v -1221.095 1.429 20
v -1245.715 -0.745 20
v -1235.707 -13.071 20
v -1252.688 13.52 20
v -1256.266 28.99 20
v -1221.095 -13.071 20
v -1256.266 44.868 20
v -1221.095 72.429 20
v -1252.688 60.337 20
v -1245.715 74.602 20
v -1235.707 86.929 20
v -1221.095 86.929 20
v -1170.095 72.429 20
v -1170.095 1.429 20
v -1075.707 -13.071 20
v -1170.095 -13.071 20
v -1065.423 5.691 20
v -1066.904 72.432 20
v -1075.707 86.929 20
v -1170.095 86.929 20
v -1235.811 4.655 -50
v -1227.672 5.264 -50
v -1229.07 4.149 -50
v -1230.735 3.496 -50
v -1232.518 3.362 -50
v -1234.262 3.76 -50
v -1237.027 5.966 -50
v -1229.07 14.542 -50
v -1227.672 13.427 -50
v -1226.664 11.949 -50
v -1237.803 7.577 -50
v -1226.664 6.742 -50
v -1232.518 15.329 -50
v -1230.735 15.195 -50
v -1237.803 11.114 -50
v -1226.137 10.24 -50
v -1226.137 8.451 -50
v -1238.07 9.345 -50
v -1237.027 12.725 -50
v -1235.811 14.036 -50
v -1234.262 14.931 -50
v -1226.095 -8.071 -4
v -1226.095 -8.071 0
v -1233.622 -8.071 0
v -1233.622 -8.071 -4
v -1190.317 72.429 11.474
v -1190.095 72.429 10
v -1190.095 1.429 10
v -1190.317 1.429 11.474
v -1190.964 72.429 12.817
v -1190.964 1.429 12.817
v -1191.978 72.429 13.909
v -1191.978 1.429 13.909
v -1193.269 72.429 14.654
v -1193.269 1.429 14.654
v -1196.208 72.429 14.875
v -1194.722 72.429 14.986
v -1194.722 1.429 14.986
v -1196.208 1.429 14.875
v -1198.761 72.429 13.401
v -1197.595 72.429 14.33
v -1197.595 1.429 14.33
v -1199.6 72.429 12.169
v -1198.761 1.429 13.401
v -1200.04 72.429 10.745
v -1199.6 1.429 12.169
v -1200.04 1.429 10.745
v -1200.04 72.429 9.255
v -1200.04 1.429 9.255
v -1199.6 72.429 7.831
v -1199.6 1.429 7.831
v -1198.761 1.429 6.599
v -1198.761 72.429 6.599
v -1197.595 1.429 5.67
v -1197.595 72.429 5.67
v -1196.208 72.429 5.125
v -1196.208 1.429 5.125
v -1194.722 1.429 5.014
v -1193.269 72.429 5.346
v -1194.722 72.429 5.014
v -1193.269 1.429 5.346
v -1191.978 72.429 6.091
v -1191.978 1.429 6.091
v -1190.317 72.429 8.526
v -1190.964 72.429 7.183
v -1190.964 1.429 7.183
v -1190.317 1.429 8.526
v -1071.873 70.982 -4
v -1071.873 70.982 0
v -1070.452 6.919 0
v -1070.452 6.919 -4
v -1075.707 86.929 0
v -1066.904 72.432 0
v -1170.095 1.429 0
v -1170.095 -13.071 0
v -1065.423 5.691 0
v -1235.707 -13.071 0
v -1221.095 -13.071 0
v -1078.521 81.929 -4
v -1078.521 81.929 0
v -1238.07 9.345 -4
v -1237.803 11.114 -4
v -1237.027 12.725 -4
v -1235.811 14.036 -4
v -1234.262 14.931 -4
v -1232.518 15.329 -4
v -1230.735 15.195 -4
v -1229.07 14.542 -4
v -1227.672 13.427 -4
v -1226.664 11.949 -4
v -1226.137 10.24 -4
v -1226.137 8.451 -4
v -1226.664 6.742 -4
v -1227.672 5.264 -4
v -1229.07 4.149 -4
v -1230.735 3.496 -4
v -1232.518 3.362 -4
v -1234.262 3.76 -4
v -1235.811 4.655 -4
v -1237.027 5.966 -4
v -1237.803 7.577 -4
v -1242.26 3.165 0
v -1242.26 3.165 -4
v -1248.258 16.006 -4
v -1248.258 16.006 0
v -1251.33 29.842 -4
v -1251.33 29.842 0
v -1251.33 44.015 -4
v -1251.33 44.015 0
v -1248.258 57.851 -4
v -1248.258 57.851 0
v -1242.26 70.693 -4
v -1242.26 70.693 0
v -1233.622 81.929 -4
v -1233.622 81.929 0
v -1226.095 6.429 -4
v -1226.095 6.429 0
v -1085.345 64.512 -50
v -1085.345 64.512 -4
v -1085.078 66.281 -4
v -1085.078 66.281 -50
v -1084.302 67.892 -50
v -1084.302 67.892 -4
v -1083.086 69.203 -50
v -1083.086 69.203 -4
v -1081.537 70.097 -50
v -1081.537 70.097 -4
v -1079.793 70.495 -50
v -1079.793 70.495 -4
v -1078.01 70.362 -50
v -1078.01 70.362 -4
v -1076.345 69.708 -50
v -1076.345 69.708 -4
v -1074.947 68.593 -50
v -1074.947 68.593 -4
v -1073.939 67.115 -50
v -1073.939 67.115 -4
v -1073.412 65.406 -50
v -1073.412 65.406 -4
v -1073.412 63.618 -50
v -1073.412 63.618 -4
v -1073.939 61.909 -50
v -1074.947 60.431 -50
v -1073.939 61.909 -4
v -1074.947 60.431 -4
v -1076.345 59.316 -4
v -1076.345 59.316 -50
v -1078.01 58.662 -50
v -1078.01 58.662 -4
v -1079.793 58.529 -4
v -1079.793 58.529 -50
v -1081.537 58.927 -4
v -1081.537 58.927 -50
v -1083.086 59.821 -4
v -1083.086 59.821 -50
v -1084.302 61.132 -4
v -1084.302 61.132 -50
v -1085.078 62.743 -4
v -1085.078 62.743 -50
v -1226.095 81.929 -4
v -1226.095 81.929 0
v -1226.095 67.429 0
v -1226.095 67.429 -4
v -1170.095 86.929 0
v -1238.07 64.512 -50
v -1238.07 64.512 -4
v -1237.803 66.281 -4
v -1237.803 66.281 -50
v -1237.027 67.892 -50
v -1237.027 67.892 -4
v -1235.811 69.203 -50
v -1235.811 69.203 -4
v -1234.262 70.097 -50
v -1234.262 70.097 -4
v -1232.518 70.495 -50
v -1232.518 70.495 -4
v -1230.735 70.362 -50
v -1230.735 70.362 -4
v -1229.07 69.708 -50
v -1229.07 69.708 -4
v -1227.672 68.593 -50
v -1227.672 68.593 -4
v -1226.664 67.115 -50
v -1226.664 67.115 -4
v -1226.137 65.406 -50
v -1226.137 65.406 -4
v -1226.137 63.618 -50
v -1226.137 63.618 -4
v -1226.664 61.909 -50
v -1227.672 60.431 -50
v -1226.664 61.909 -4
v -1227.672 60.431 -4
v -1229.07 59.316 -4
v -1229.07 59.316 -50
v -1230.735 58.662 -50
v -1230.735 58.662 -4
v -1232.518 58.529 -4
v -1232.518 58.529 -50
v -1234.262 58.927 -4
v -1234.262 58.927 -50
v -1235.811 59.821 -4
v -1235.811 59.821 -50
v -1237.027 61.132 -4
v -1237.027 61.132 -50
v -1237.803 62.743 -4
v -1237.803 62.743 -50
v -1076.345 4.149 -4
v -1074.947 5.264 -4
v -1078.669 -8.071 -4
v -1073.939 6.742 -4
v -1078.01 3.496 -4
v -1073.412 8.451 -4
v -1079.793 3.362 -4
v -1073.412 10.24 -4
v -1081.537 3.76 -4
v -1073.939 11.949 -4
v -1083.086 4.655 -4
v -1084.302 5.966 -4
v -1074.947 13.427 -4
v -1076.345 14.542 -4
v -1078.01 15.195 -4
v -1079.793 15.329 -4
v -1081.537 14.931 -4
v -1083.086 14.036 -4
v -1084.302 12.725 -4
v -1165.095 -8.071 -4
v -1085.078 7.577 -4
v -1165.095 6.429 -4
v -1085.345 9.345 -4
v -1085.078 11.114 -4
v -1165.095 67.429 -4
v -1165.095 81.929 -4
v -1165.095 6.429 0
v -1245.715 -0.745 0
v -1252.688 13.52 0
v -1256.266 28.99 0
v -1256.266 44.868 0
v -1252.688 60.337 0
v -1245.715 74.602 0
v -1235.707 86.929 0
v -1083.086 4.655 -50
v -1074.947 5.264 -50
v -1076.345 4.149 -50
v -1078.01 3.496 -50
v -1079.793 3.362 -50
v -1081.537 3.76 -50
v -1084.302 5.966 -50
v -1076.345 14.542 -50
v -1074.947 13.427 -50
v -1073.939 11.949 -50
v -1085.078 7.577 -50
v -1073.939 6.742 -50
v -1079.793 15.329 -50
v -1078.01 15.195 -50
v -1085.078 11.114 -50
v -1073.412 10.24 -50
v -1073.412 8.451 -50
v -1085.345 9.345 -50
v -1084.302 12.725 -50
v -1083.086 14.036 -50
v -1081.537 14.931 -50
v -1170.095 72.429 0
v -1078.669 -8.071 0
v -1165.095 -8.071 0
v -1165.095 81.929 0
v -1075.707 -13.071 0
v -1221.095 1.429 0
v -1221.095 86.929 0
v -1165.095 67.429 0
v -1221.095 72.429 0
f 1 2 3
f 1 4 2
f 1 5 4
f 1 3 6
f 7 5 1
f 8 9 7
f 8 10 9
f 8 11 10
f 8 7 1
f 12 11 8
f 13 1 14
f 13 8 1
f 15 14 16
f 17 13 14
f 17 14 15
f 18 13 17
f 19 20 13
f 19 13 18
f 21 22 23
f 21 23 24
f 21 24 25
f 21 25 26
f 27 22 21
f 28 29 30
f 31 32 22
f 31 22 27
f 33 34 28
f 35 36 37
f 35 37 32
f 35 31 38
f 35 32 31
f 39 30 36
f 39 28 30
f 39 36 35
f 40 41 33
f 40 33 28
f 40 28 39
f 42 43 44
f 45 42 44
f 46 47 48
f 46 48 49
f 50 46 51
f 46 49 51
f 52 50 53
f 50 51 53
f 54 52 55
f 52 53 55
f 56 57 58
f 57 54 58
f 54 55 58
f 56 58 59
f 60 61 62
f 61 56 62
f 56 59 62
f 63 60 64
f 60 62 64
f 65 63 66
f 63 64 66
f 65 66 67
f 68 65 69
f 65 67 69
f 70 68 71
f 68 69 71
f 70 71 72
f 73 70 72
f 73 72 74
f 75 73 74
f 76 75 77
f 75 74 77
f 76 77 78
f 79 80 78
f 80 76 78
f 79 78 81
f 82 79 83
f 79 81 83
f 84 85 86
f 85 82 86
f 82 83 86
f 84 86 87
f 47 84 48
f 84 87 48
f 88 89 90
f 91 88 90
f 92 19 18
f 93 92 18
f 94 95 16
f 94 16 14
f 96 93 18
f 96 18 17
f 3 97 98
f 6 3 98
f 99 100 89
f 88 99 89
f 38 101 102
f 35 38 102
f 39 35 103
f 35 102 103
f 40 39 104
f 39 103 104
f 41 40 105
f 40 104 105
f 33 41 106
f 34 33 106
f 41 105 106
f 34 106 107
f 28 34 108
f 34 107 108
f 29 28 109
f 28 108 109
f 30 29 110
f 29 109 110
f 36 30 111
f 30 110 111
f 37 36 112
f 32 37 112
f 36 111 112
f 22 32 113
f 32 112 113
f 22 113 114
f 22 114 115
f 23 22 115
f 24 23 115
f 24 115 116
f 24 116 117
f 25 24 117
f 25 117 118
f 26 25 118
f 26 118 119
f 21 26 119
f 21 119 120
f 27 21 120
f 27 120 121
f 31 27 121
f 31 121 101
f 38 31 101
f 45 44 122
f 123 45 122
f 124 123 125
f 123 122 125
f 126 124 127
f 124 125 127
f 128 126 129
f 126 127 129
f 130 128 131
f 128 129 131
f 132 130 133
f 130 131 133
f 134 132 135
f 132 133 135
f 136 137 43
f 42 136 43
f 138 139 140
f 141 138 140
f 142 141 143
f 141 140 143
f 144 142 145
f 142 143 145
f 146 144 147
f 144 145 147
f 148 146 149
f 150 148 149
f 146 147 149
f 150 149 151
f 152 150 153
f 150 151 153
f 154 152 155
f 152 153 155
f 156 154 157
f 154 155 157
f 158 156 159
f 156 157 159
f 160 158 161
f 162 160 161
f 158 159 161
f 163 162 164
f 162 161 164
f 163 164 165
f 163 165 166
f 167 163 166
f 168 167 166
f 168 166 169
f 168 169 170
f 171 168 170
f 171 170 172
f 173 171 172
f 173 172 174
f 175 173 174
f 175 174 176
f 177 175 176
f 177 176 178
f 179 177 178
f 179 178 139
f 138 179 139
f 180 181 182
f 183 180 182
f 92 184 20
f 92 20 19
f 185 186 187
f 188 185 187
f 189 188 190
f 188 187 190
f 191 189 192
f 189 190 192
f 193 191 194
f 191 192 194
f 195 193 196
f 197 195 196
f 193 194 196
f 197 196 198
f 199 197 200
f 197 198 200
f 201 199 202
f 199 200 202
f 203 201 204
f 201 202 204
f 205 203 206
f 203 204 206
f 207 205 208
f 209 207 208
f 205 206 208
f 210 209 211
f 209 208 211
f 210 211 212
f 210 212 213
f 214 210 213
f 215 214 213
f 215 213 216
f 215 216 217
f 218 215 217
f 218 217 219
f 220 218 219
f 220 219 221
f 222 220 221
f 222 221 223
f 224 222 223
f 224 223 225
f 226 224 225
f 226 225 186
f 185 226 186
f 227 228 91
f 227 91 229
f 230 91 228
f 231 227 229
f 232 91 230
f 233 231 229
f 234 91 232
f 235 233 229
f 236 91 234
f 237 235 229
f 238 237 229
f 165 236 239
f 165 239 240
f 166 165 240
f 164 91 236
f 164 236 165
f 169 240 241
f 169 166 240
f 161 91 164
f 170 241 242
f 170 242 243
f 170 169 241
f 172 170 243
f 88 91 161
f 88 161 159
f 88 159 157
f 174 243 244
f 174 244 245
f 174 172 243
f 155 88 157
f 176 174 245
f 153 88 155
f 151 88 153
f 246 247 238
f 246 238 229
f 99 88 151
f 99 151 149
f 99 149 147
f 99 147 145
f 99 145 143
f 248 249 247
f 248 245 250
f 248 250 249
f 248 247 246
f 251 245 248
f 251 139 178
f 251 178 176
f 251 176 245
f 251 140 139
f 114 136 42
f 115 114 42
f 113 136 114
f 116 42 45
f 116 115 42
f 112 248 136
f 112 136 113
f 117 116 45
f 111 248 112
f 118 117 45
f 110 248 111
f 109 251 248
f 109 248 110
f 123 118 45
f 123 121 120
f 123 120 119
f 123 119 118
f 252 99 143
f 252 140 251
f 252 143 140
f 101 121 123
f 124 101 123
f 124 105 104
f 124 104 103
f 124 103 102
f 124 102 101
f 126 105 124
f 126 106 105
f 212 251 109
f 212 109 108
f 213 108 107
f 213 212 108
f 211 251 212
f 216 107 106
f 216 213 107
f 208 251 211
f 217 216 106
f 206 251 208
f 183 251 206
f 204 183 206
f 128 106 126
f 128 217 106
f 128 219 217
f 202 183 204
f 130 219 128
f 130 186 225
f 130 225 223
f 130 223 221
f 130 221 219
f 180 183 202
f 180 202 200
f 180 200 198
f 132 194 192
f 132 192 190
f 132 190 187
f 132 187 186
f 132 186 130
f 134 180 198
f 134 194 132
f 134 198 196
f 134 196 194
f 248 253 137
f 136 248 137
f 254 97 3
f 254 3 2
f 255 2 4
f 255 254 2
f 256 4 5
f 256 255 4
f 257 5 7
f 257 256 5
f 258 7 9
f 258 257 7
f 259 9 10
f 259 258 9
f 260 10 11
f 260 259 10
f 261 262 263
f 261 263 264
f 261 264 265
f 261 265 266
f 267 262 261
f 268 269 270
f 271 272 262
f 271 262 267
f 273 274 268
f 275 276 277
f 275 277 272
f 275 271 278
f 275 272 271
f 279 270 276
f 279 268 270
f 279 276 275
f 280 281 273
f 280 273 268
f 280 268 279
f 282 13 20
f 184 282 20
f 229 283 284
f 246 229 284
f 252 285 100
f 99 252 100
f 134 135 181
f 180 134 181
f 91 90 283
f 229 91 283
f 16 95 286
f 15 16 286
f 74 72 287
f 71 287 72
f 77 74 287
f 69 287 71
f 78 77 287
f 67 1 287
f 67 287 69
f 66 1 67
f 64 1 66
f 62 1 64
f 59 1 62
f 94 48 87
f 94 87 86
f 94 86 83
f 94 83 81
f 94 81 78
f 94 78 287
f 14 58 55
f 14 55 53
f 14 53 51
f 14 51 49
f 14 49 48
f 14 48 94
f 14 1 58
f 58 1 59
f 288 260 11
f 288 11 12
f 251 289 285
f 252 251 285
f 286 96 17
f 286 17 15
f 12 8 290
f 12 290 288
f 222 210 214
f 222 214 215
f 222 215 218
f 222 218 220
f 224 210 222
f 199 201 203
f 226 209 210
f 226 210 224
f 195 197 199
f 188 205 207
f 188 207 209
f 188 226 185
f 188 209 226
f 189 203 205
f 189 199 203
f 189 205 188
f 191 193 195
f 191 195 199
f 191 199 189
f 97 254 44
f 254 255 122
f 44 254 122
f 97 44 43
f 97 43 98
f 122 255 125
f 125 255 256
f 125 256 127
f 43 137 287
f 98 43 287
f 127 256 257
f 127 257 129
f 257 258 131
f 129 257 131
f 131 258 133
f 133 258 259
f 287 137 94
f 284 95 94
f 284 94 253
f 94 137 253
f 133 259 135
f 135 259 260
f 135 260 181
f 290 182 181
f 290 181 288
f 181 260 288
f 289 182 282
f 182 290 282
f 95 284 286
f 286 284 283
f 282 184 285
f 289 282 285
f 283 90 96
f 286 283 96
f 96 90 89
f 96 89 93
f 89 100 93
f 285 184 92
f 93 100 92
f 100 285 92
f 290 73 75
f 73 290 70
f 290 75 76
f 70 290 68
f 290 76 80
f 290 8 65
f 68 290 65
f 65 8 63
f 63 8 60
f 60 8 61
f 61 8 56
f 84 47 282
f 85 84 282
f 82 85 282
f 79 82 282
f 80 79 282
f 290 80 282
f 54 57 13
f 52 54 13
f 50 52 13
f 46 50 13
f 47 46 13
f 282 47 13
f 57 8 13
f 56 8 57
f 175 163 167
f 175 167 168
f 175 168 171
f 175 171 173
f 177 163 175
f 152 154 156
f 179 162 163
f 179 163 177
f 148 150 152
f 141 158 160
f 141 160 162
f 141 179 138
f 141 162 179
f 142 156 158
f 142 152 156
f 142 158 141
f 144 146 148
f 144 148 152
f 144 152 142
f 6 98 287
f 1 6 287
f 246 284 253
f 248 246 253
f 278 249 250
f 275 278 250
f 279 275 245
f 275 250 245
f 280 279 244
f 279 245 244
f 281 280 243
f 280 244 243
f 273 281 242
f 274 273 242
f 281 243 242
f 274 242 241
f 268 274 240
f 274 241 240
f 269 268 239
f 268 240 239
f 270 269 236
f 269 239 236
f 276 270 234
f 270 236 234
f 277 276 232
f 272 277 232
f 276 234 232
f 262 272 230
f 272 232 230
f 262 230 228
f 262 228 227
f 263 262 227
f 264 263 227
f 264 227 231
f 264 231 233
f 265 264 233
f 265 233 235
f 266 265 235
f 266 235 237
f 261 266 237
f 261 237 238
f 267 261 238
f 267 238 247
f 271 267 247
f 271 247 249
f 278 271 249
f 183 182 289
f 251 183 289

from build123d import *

# Parameters (mm, degrees)
SKETCH5_W               = 160
SKETCH5_H               = 100
BOSS_EXTRUDE2_DEPTH     = 20
SKETCH6_W               = 51
SKETCH6_H               = 15
CUT_EXTRUDE1_DEPTH      = 1
CUT_EXTRUDE1_DEPTH_BACK = 21
SKETCH7_R               = 6
BOSS_EXTRUDE3_DEPTH     = 50
SKETCH8_R               = 5
CUT_EXTRUDE2_DEPTH      = 15.5
CUT_EXTRUDE2_DEPTH_BACK = 86.5
BOSS_EXTRUDE4_DEPTH     = 4
BOSS_EXTRUDE5_DEPTH     = 5


with BuildPart() as part:
    # Sketch5 → Boss-Extrude2 (new body)
    with BuildSketch(Plane.XY):
        with Locations((-1155.707372839, 36.928751241)):
            Rectangle(SKETCH5_W, SKETCH5_H)
        Polygon((-1065.42313354, 5.690501508), (-1075.707372839, -13.071248759), (-1075.707372839, 86.928751241), (-1066.90354904, 72.432300318), align=None)
        with BuildLine():
            Line((-1235.707372839, 86.928751241), (-1235.707372839, -13.071248759))
            ThreePointArc((-1235.707372839, -13.071248759), (-1256.717577983, 36.928751241), (-1235.707372839, 86.928751241))
        make_face()
    extrude(amount=BOSS_EXTRUDE2_DEPTH)

    # Sketch6 → Cut-Extrude1 (cut, two sides)
    with BuildSketch(Plane.XY.offset(20)) as cut_extrude1_sk:
        with Locations((-1195.595351444, -6.071248759)):
            Rectangle(SKETCH6_W, SKETCH6_H)
        with Locations((-1195.595351444, 79.928751241)):
            Rectangle(SKETCH6_W, SKETCH6_H)
    extrude(amount=CUT_EXTRUDE1_DEPTH, mode=Mode.SUBTRACT)
    extrude(cut_extrude1_sk.sketch, amount=-CUT_EXTRUDE1_DEPTH_BACK, mode=Mode.SUBTRACT)

    # Sketch7 → Boss-Extrude3 (add)
    with BuildSketch(Plane(origin=(0, 0, 0), x_dir=(-1, 0, 0), z_dir=(0, 0, -1))):
        with Locations((1079.344915198, 64.512007402)):
            Circle(SKETCH7_R)
        with Locations((1079.344915198, 9.345495081)):
            Circle(SKETCH7_R)
        with Locations((1232.069830479, 9.345495081)):
            Circle(SKETCH7_R)
        with Locations((1232.069830479, 64.512007402)):
            Circle(SKETCH7_R)
    extrude(amount=BOSS_EXTRUDE3_DEPTH)

    # Sketch8 → Cut-Extrude2 (cut, two sides)
    with BuildSketch(Plane.XZ.offset(-1.428751241)) as cut_extrude2_sk:
        with Locations((-1195.095351444, 10)):
            Circle(SKETCH8_R)
    extrude(amount=CUT_EXTRUDE2_DEPTH, mode=Mode.SUBTRACT)
    extrude(cut_extrude2_sk.sketch, amount=-CUT_EXTRUDE2_DEPTH_BACK, mode=Mode.SUBTRACT)

    # Sketch9 → Boss-Extrude4 (add)
    with BuildSketch(Plane(origin=(0, 0, 0), x_dir=(-1, 0, 0), z_dir=(0, 0, -1))):
        with BuildLine():
            Line((1165.095351444, 6.428751241), (1226.095351444, 6.428751241))
            Line((1226.095351444, 6.428751241), (1226.095351444, -8.071248759))
            Line((1226.095351444, -8.071248759), (1233.621735581, -8.071248759))
            ThreePointArc((1233.621735581, -8.071248759), (1251.717577983, 36.928751241), (1233.621735581, 81.928751241))
            Line((1233.621735581, 81.928751241), (1226.095351444, 81.928751241))
            Line((1226.095351444, 81.928751241), (1226.095351444, 67.428751241))
            Line((1226.095351444, 67.428751241), (1165.095351444, 67.428751241))
            Line((1165.095351444, 67.428751241), (1165.095351444, 81.928751241))
            Line((1165.095351444, 81.928751241), (1078.520666135, 81.928751241))
            Line((1078.520666135, 81.928751241), (1071.872609564, 70.982004916))
            Line((1071.872609564, 70.982004916), (1070.451613888, 6.919039109))
            Line((1070.451613888, 6.919039109), (1078.668528909, -8.071248759))
            Line((1078.668528909, -8.071248759), (1165.095351444, -8.071248759))
            Line((1165.095351444, -8.071248759), (1165.095351444, 6.428751241))
        make_face()
    extrude(amount=BOSS_EXTRUDE4_DEPTH)

    # Sketch10 → Boss-Extrude5 (add)
    with BuildSketch(Plane(origin=(0, 0, 0), x_dir=(-1, 0, 0), z_dir=(0, 0, -1))):
        with BuildLine():
            Line((1170.095351444, 1.428751241), (1221.095351444, 1.428751241))
            Line((1221.095351444, 1.428751241), (1221.095351444, -13.071248759))
            Line((1221.095351444, -13.071248759), (1235.707372839, -13.071248759))
            ThreePointArc((1235.707372839, -13.071248759), (1256.717577983, 36.928751241), (1235.707372839, 86.928751241))
            Line((1235.707372839, 86.928751241), (1221.095351444, 86.928751241))
            Line((1221.095351444, 86.928751241), (1221.095351444, 72.428751241))
            Line((1221.095351444, 72.428751241), (1170.095351444, 72.428751241))
            Line((1170.095351444, 72.428751241), (1170.095351444, 86.928751241))
            Line((1170.095351444, 86.928751241), (1075.707372839, 86.928751241))
            Line((1075.707372839, 86.928751241), (1066.90354904, 72.432300318))
            Line((1066.90354904, 72.432300318), (1065.42313354, 5.690501508))
            Line((1065.42313354, 5.690501508), (1075.707372839, -13.071248759))
            Line((1075.707372839, -13.071248759), (1170.095351444, -13.071248759))
            Line((1170.095351444, -13.071248759), (1170.095351444, 1.428751241))
        make_face()
    extrude(amount=-BOSS_EXTRUDE5_DEPTH)


solid = part.part
